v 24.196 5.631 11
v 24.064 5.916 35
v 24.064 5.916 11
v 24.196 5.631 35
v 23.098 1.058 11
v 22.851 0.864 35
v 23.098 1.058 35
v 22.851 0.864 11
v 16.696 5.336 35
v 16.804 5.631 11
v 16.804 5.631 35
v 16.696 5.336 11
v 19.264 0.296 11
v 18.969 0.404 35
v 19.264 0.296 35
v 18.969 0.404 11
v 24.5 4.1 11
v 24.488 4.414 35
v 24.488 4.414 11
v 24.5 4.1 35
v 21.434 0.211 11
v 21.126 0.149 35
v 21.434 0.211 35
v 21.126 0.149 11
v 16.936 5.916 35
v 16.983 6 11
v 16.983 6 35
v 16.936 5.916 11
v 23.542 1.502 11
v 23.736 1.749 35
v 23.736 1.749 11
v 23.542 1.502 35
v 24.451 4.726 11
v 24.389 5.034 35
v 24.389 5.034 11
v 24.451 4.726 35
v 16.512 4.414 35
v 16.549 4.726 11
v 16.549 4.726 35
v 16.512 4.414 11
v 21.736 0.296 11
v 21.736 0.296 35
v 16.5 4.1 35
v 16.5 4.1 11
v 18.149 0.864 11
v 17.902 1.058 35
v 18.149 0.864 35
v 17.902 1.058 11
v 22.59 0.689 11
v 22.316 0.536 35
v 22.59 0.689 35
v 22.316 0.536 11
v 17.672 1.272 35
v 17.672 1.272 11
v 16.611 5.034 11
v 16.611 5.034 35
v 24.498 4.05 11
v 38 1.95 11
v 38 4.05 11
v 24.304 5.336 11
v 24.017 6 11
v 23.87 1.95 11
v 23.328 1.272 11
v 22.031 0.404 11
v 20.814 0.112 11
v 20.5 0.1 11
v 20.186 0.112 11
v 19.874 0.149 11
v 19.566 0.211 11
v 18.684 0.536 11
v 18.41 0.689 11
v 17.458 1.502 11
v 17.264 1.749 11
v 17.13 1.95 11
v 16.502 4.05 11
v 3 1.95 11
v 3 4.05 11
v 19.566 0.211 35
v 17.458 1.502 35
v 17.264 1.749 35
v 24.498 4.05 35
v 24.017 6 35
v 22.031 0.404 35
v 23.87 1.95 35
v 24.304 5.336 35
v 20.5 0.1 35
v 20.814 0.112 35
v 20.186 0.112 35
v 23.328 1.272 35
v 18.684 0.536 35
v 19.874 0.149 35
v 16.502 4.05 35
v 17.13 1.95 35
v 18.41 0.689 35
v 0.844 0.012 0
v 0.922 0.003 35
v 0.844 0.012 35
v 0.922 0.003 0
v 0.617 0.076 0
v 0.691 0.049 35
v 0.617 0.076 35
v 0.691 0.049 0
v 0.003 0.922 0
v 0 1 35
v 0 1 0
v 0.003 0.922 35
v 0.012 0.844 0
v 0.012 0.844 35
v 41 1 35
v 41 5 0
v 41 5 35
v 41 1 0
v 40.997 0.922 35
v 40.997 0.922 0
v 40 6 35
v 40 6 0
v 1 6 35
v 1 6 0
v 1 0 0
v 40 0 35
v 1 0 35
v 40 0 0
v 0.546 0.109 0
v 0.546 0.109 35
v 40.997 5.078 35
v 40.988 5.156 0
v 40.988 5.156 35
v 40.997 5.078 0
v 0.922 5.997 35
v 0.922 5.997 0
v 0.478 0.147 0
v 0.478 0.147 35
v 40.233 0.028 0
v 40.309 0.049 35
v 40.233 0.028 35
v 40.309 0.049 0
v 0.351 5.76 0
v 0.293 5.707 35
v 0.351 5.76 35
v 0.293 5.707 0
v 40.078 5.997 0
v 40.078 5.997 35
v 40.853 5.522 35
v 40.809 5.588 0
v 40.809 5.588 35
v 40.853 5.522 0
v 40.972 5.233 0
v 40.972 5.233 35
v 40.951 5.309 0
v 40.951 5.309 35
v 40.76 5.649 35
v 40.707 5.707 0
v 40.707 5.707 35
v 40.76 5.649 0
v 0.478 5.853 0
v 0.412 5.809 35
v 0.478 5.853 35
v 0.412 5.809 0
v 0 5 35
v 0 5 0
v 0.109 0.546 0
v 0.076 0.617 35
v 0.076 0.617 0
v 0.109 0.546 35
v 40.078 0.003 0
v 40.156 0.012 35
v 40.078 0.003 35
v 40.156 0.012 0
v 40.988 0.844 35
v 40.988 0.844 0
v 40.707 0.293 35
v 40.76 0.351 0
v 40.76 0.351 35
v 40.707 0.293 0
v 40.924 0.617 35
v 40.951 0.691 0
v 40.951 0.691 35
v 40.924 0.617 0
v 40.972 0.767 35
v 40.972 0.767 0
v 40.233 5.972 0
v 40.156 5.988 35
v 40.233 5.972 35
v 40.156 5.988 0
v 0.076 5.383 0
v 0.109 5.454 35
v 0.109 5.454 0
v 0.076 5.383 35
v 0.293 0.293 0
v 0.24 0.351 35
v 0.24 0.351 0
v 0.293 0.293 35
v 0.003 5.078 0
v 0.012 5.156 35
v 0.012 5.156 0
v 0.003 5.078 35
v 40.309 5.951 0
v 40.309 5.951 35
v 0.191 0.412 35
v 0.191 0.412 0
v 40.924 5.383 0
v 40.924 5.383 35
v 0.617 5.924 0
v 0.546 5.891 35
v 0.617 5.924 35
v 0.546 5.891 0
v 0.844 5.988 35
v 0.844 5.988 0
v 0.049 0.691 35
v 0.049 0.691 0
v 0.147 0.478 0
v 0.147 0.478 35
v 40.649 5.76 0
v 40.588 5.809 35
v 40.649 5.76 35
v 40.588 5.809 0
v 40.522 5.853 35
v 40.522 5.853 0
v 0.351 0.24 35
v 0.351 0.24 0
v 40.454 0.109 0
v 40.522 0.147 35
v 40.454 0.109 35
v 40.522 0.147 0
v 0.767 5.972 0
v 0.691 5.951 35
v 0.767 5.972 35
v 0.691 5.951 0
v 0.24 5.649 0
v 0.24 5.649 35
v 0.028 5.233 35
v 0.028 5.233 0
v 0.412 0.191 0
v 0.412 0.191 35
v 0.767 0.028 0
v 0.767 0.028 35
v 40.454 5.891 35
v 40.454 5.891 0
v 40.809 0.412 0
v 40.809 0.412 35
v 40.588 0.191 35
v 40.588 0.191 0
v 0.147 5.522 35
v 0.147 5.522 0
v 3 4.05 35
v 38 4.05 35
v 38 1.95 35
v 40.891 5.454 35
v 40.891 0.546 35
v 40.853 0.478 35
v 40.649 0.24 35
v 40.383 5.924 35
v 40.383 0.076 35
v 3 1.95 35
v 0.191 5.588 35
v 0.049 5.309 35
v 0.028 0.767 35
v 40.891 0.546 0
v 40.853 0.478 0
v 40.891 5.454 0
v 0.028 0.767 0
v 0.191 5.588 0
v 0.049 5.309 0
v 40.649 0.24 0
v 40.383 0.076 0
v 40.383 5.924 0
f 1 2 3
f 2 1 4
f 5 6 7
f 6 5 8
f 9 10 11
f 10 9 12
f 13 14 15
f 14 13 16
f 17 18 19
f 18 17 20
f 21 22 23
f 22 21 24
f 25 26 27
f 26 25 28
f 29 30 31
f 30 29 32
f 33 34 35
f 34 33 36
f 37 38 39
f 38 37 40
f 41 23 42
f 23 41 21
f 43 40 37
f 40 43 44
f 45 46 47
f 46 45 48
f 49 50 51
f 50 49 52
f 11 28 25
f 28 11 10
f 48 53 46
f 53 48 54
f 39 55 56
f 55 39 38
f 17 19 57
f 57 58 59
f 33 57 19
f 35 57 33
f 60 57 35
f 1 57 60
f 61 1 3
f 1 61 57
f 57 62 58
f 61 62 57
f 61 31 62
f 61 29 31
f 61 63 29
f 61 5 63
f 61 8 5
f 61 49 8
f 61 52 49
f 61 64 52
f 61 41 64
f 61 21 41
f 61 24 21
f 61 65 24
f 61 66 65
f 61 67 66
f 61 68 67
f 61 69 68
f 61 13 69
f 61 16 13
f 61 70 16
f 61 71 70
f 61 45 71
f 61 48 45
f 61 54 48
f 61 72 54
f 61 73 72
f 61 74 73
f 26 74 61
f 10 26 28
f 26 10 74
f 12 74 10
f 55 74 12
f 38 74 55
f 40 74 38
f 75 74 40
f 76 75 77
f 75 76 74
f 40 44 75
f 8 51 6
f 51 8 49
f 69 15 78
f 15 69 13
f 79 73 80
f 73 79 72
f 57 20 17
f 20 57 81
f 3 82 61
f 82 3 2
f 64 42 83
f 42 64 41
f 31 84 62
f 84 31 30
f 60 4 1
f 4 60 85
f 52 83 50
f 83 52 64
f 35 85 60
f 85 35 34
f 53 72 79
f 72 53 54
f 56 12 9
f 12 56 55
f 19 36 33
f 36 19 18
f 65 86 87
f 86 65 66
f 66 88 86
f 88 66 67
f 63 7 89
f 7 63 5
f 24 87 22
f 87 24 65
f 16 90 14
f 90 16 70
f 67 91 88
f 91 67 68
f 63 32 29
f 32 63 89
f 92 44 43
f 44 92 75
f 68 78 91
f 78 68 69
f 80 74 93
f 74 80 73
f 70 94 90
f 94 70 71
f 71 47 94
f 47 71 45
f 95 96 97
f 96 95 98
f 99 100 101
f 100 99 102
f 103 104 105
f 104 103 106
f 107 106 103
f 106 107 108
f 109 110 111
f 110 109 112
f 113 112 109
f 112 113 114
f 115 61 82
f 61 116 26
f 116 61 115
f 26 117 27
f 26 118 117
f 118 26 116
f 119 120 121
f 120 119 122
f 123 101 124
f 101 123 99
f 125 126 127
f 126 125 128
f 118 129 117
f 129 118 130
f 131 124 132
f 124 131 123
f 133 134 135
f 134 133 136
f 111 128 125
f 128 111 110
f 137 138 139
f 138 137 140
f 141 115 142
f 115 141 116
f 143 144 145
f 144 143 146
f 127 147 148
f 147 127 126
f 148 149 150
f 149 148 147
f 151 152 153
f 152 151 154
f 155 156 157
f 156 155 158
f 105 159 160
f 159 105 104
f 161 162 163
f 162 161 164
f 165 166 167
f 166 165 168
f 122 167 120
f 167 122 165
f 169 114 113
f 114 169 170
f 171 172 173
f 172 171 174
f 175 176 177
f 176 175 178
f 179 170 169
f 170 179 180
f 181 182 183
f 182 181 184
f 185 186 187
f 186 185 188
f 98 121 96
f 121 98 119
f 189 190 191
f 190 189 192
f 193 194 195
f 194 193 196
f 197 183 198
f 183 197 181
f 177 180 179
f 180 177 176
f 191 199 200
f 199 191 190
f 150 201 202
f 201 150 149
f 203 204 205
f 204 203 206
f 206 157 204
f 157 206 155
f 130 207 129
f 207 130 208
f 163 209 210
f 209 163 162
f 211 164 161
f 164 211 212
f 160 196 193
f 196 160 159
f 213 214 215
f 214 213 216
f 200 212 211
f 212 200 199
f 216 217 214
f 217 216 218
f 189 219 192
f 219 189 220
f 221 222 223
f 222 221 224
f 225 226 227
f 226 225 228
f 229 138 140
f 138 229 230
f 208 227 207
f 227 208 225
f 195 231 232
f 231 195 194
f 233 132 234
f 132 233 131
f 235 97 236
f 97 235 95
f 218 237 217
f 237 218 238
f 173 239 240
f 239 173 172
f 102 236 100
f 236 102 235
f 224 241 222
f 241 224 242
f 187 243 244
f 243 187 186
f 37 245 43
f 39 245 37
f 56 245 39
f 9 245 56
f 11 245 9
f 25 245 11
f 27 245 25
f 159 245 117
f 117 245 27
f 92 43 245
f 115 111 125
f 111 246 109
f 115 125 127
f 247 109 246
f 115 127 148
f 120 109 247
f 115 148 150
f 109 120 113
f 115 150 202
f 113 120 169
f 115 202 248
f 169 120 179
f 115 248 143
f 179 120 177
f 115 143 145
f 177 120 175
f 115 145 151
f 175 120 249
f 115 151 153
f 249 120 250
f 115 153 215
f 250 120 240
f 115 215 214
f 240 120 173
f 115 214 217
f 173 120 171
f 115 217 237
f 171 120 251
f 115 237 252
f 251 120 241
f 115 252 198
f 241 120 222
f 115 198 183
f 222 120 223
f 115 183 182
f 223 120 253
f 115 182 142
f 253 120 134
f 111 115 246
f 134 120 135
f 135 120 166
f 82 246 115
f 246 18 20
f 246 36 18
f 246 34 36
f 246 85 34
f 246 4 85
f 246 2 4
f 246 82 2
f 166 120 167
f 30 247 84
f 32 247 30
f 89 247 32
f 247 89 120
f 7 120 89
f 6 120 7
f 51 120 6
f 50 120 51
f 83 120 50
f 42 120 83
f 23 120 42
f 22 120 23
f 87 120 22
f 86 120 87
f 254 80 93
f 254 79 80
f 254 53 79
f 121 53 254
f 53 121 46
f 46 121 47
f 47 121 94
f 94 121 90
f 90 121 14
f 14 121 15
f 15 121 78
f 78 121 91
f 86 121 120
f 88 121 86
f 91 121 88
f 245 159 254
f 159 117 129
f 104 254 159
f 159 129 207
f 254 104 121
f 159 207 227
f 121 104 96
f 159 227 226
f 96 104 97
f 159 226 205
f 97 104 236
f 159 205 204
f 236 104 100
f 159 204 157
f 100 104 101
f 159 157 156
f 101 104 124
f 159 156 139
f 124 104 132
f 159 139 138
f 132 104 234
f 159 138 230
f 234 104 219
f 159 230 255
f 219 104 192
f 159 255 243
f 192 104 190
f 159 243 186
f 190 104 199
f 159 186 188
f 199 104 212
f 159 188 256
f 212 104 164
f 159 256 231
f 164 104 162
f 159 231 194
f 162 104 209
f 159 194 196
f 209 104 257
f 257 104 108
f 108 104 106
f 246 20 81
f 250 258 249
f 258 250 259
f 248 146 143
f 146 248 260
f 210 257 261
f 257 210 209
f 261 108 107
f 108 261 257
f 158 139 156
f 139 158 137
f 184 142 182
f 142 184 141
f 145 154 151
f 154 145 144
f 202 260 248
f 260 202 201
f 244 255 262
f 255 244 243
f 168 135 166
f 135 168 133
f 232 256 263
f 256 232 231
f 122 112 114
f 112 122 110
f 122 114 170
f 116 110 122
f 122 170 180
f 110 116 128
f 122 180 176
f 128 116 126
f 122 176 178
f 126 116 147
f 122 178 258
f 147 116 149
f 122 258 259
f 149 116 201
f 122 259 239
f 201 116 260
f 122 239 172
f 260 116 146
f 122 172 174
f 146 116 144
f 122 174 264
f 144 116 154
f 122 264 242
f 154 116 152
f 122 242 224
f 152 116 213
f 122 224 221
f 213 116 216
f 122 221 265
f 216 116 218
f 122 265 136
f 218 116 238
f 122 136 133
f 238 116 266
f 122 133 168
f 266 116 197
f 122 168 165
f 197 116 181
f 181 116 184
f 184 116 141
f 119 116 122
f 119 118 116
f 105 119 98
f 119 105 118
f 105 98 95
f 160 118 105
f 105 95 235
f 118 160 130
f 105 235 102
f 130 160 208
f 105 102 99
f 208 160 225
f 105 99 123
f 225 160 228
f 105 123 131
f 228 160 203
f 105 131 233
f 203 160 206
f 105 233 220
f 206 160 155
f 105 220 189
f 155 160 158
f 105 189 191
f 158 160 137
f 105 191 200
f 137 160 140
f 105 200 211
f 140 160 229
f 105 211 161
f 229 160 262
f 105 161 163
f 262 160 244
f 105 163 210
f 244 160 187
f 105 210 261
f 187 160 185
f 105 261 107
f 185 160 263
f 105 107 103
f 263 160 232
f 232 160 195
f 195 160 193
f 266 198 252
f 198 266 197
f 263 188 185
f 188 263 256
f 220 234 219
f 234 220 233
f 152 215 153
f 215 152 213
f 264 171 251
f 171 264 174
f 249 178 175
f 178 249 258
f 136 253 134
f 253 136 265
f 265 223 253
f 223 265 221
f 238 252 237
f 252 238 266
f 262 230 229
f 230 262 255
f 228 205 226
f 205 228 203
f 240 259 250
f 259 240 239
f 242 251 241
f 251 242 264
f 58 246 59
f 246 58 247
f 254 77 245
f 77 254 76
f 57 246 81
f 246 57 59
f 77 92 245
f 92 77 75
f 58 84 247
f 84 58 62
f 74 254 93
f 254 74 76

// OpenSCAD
$fn = 80;

//
// cube([41, 6, 35]);
module pin() {
    rotate([0, 0, 90])
    difference() {

        cylinder(h = 26, r = 4);
        translate([2, -10, -1])
        cube([2, 20, 28]);
    }
}

width = 41;
thickness = 6;
height = 35;

edgeRadius = 1;
difference() {
    translate([edgeRadius, edgeRadius, 0]) {
        hull() {
            cylinder(h = height, r = edgeRadius);
            
            translate([0, thickness - edgeRadius * 2, 0])
            cylinder(h = height, r = edgeRadius);


            translate([width - edgeRadius * 2, 0, 0]) { 
                cylinder(h = height, r = edgeRadius);
                
                translate([0, thickness - edgeRadius * 2, 0])
                cylinder(h = height, r = edgeRadius);
            }
        }
    }

    translate([3, (thickness - 2.1) / 2, 11])
    cube([35, 2.1, 26]);
    translate([20.5, 4.1, 11])
    pin();
}
